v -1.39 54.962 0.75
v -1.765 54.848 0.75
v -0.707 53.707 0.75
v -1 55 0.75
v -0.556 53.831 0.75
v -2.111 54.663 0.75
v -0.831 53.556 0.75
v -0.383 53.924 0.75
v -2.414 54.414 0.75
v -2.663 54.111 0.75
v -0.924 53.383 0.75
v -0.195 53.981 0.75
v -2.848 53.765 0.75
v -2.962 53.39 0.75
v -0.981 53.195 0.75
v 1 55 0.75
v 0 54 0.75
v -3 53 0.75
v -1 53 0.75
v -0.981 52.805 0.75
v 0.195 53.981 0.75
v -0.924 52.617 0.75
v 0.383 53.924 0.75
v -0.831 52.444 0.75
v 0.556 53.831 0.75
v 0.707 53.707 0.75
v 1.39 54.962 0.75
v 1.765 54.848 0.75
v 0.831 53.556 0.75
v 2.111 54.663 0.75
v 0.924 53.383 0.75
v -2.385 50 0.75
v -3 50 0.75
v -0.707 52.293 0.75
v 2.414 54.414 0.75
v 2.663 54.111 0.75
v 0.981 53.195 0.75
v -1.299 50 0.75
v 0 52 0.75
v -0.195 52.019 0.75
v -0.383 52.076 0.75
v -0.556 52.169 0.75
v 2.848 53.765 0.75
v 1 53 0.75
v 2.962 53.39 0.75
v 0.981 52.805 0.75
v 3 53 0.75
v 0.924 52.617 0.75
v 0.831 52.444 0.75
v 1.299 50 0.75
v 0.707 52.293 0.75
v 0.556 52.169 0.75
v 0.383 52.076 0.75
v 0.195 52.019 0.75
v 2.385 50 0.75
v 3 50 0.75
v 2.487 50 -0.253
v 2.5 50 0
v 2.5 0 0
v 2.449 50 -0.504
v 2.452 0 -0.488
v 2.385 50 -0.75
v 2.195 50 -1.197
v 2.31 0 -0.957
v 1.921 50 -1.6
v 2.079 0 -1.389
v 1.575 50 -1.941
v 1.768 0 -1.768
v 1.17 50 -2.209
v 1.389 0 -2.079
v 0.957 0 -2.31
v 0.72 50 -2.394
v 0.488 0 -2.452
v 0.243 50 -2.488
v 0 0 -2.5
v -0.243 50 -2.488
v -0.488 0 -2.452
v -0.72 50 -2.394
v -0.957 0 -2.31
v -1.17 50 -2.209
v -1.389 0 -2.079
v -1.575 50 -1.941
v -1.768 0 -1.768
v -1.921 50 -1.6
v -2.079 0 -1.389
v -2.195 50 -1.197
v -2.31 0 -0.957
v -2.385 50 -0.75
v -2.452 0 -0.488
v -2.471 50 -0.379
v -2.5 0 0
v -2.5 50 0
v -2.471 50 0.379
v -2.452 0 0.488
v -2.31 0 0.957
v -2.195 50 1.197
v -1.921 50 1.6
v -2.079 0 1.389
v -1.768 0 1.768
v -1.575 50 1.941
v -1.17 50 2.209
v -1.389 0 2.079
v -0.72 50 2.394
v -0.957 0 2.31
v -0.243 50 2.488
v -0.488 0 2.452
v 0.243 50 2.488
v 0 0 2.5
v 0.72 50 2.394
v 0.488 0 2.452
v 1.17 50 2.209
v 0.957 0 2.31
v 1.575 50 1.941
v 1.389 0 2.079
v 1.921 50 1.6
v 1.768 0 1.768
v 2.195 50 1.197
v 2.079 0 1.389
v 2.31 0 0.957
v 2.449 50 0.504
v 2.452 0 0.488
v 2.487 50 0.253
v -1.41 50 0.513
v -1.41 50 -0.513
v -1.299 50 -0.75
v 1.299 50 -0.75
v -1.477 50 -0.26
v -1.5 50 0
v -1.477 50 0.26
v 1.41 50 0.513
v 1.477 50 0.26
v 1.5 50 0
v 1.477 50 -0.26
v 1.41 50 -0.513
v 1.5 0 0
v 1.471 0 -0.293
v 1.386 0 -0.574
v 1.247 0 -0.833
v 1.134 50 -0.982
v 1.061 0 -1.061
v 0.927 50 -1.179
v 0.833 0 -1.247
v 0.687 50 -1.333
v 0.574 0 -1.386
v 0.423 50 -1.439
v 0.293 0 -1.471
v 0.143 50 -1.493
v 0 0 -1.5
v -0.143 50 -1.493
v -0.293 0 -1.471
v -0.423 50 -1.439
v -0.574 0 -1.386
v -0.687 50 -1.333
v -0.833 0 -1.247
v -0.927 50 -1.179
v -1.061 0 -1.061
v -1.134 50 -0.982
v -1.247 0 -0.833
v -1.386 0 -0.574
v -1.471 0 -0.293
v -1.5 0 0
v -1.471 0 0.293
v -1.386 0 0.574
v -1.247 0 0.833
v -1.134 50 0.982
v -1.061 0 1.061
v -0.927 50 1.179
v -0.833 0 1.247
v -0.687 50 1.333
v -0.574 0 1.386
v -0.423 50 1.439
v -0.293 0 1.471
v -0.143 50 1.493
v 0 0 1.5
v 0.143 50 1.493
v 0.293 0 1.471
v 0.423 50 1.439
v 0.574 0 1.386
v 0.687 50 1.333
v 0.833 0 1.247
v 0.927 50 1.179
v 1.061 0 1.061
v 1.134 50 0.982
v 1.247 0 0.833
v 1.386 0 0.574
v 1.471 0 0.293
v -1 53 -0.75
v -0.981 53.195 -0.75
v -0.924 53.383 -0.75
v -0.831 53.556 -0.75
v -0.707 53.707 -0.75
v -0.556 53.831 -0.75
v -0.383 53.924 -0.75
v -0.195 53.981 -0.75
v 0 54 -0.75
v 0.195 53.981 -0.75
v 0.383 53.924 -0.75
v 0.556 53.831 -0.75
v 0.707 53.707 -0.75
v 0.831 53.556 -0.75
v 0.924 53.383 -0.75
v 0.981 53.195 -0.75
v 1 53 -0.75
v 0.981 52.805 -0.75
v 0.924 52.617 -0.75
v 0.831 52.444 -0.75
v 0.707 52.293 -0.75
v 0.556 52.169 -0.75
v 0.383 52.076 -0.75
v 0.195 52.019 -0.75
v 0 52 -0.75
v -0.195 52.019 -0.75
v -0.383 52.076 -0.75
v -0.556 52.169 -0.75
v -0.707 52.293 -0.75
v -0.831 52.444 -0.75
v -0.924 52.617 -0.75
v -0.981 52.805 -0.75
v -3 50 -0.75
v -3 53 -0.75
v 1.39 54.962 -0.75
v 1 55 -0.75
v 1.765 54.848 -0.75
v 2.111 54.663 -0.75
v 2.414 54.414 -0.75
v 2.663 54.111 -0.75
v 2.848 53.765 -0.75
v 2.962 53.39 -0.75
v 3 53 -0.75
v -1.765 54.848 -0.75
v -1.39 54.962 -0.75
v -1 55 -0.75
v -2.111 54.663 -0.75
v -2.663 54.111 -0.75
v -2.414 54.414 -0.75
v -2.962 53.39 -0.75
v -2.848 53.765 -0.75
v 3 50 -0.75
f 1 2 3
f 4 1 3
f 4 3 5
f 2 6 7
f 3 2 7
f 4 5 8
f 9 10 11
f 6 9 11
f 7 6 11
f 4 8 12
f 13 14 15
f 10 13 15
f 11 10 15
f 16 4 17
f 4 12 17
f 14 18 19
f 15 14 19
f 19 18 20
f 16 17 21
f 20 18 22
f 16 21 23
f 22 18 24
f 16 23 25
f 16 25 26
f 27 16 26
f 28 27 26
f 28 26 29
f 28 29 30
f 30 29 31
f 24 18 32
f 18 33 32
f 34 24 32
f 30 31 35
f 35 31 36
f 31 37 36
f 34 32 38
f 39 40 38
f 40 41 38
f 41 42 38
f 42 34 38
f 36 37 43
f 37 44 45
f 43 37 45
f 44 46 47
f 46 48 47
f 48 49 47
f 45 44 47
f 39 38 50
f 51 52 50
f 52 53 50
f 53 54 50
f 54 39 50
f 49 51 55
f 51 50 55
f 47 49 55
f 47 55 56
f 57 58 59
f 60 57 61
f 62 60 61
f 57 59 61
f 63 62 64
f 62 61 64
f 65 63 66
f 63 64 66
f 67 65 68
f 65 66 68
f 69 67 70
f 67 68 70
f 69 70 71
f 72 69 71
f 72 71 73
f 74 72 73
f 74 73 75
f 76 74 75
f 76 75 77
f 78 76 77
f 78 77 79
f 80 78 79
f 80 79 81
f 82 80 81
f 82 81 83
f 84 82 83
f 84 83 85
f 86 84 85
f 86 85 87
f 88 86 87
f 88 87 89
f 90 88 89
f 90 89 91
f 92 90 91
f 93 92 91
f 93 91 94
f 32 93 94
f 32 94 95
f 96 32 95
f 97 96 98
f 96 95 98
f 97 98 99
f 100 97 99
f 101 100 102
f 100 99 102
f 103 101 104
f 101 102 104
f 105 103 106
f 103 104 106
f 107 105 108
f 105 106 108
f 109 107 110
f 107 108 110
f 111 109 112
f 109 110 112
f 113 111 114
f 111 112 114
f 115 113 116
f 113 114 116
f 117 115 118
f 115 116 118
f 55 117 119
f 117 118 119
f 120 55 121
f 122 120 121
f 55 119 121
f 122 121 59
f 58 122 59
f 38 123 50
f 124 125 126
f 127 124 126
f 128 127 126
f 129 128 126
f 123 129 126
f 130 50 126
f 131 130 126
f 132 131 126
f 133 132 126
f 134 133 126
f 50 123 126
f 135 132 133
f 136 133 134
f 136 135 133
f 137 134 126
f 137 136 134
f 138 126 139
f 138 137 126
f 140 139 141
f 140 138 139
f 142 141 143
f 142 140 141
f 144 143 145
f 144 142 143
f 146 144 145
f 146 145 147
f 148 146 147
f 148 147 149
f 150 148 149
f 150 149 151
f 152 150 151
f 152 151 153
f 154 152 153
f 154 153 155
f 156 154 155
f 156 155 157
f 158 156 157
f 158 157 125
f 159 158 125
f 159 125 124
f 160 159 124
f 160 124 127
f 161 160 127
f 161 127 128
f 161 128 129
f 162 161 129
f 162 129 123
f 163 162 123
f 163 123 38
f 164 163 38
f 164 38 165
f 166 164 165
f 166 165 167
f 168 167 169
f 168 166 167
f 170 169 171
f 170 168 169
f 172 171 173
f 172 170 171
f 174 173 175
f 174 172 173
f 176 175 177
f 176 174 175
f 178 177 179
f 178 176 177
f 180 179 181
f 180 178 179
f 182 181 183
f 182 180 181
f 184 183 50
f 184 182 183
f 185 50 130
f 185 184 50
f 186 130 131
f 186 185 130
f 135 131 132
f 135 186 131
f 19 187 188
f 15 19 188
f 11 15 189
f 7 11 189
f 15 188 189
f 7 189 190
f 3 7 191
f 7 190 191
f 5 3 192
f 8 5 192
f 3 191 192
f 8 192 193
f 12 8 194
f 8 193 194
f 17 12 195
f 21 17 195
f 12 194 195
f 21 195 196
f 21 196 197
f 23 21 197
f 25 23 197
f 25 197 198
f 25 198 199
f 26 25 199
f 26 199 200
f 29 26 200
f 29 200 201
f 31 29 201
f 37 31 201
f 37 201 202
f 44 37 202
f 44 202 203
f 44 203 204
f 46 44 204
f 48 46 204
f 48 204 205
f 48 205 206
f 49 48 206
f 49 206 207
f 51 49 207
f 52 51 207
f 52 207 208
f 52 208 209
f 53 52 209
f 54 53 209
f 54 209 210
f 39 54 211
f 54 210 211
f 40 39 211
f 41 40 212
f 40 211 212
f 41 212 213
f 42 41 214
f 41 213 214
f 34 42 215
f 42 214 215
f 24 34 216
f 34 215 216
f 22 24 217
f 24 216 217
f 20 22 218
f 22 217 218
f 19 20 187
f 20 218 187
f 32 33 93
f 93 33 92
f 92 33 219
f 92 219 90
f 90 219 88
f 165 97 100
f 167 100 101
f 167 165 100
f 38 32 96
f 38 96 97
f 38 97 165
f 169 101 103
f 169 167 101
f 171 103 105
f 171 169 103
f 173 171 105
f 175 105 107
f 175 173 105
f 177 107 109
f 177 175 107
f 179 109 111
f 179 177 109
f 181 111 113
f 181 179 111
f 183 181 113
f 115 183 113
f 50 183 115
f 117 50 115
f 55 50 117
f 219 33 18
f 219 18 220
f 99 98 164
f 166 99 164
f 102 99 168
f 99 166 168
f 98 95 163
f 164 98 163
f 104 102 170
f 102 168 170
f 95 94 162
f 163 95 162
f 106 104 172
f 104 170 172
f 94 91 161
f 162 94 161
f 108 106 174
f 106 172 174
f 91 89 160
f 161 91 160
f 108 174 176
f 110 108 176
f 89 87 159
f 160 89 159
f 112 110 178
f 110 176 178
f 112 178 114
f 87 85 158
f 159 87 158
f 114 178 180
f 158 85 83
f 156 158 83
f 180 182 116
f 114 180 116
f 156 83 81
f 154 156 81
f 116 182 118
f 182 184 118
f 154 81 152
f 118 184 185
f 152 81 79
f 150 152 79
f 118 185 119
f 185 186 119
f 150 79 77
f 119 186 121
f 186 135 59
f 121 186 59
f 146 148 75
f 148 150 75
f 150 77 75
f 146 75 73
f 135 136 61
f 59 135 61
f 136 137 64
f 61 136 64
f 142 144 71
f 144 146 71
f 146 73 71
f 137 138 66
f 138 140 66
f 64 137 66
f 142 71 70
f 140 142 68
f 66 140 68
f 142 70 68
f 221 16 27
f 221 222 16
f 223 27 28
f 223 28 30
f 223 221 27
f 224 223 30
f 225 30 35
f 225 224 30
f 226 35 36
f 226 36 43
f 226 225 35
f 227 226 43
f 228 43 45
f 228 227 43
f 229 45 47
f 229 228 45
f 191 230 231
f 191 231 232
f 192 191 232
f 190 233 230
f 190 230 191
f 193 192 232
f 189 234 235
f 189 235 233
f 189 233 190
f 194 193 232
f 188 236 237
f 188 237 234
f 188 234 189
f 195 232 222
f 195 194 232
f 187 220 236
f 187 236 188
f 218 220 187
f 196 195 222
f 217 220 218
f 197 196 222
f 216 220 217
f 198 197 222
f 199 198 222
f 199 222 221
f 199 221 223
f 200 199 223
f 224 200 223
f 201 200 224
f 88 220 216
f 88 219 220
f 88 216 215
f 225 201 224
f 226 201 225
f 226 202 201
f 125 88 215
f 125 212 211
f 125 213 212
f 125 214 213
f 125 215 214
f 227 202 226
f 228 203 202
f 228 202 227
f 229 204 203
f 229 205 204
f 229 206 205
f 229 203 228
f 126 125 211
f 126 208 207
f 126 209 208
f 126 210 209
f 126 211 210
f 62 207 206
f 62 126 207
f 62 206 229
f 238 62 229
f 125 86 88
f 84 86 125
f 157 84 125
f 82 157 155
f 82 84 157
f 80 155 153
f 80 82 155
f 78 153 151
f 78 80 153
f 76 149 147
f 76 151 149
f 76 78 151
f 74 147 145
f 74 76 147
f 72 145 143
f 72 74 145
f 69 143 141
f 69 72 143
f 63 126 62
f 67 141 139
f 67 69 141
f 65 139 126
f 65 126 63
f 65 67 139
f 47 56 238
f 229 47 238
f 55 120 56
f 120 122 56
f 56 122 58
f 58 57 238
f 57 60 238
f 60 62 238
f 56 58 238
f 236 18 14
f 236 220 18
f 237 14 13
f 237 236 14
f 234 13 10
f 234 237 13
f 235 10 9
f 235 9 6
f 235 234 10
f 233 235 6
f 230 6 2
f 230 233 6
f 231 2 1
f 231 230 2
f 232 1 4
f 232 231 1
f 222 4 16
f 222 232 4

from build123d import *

# Parameters (mm, degrees)
SKETCH1_R           = 2.5
SKETCH1_R_2         = 1.5
BOSS_EXTRUDE1_DEPTH = 50
SKETCH2_W           = 6
SKETCH2_H           = 1.5
BOSS_EXTRUDE2_DEPTH = 5
SKETCH3_R           = 1
CUT_EXTRUDE1_DEPTH  = 4.25
FILLET1_R           = 2


with BuildPart() as part:
    # Sketch1 → Boss-Extrude1 (new body)
    with BuildSketch(Plane(origin=(0, 0, 0), x_dir=(1, 0, 0), z_dir=(0, 1, 0))):
        Circle(SKETCH1_R)
        Circle(SKETCH1_R_2, mode=Mode.SUBTRACT)
    extrude(amount=BOSS_EXTRUDE1_DEPTH)

    # Sketch2 → Boss-Extrude2 (add)
    with BuildSketch(Plane(origin=(0, 50, 0), x_dir=(1, 0, 0), z_dir=(0, 1, 0))):
        Rectangle(SKETCH2_W, SKETCH2_H)
    extrude(amount=BOSS_EXTRUDE2_DEPTH)

    # Sketch3 → Cut-Extrude1 (cut, through all)
    with BuildSketch(Plane(origin=(0, 0, -0.75), x_dir=(-1, 0, 0), z_dir=(0, 0, -1))):
        with Locations((0, 53)):
            Circle(SKETCH3_R)
    extrude(amount=-CUT_EXTRUDE1_DEPTH, mode=Mode.SUBTRACT)

    # Fillet1
    fillet1_edges = [part.edges().sort_by_distance(p)[0] for p in [
        (3, 55, 0),
        (-3, 55, 0),
    ]]
    fillet(fillet1_edges, radius=FILLET1_R)


solid = part.part
